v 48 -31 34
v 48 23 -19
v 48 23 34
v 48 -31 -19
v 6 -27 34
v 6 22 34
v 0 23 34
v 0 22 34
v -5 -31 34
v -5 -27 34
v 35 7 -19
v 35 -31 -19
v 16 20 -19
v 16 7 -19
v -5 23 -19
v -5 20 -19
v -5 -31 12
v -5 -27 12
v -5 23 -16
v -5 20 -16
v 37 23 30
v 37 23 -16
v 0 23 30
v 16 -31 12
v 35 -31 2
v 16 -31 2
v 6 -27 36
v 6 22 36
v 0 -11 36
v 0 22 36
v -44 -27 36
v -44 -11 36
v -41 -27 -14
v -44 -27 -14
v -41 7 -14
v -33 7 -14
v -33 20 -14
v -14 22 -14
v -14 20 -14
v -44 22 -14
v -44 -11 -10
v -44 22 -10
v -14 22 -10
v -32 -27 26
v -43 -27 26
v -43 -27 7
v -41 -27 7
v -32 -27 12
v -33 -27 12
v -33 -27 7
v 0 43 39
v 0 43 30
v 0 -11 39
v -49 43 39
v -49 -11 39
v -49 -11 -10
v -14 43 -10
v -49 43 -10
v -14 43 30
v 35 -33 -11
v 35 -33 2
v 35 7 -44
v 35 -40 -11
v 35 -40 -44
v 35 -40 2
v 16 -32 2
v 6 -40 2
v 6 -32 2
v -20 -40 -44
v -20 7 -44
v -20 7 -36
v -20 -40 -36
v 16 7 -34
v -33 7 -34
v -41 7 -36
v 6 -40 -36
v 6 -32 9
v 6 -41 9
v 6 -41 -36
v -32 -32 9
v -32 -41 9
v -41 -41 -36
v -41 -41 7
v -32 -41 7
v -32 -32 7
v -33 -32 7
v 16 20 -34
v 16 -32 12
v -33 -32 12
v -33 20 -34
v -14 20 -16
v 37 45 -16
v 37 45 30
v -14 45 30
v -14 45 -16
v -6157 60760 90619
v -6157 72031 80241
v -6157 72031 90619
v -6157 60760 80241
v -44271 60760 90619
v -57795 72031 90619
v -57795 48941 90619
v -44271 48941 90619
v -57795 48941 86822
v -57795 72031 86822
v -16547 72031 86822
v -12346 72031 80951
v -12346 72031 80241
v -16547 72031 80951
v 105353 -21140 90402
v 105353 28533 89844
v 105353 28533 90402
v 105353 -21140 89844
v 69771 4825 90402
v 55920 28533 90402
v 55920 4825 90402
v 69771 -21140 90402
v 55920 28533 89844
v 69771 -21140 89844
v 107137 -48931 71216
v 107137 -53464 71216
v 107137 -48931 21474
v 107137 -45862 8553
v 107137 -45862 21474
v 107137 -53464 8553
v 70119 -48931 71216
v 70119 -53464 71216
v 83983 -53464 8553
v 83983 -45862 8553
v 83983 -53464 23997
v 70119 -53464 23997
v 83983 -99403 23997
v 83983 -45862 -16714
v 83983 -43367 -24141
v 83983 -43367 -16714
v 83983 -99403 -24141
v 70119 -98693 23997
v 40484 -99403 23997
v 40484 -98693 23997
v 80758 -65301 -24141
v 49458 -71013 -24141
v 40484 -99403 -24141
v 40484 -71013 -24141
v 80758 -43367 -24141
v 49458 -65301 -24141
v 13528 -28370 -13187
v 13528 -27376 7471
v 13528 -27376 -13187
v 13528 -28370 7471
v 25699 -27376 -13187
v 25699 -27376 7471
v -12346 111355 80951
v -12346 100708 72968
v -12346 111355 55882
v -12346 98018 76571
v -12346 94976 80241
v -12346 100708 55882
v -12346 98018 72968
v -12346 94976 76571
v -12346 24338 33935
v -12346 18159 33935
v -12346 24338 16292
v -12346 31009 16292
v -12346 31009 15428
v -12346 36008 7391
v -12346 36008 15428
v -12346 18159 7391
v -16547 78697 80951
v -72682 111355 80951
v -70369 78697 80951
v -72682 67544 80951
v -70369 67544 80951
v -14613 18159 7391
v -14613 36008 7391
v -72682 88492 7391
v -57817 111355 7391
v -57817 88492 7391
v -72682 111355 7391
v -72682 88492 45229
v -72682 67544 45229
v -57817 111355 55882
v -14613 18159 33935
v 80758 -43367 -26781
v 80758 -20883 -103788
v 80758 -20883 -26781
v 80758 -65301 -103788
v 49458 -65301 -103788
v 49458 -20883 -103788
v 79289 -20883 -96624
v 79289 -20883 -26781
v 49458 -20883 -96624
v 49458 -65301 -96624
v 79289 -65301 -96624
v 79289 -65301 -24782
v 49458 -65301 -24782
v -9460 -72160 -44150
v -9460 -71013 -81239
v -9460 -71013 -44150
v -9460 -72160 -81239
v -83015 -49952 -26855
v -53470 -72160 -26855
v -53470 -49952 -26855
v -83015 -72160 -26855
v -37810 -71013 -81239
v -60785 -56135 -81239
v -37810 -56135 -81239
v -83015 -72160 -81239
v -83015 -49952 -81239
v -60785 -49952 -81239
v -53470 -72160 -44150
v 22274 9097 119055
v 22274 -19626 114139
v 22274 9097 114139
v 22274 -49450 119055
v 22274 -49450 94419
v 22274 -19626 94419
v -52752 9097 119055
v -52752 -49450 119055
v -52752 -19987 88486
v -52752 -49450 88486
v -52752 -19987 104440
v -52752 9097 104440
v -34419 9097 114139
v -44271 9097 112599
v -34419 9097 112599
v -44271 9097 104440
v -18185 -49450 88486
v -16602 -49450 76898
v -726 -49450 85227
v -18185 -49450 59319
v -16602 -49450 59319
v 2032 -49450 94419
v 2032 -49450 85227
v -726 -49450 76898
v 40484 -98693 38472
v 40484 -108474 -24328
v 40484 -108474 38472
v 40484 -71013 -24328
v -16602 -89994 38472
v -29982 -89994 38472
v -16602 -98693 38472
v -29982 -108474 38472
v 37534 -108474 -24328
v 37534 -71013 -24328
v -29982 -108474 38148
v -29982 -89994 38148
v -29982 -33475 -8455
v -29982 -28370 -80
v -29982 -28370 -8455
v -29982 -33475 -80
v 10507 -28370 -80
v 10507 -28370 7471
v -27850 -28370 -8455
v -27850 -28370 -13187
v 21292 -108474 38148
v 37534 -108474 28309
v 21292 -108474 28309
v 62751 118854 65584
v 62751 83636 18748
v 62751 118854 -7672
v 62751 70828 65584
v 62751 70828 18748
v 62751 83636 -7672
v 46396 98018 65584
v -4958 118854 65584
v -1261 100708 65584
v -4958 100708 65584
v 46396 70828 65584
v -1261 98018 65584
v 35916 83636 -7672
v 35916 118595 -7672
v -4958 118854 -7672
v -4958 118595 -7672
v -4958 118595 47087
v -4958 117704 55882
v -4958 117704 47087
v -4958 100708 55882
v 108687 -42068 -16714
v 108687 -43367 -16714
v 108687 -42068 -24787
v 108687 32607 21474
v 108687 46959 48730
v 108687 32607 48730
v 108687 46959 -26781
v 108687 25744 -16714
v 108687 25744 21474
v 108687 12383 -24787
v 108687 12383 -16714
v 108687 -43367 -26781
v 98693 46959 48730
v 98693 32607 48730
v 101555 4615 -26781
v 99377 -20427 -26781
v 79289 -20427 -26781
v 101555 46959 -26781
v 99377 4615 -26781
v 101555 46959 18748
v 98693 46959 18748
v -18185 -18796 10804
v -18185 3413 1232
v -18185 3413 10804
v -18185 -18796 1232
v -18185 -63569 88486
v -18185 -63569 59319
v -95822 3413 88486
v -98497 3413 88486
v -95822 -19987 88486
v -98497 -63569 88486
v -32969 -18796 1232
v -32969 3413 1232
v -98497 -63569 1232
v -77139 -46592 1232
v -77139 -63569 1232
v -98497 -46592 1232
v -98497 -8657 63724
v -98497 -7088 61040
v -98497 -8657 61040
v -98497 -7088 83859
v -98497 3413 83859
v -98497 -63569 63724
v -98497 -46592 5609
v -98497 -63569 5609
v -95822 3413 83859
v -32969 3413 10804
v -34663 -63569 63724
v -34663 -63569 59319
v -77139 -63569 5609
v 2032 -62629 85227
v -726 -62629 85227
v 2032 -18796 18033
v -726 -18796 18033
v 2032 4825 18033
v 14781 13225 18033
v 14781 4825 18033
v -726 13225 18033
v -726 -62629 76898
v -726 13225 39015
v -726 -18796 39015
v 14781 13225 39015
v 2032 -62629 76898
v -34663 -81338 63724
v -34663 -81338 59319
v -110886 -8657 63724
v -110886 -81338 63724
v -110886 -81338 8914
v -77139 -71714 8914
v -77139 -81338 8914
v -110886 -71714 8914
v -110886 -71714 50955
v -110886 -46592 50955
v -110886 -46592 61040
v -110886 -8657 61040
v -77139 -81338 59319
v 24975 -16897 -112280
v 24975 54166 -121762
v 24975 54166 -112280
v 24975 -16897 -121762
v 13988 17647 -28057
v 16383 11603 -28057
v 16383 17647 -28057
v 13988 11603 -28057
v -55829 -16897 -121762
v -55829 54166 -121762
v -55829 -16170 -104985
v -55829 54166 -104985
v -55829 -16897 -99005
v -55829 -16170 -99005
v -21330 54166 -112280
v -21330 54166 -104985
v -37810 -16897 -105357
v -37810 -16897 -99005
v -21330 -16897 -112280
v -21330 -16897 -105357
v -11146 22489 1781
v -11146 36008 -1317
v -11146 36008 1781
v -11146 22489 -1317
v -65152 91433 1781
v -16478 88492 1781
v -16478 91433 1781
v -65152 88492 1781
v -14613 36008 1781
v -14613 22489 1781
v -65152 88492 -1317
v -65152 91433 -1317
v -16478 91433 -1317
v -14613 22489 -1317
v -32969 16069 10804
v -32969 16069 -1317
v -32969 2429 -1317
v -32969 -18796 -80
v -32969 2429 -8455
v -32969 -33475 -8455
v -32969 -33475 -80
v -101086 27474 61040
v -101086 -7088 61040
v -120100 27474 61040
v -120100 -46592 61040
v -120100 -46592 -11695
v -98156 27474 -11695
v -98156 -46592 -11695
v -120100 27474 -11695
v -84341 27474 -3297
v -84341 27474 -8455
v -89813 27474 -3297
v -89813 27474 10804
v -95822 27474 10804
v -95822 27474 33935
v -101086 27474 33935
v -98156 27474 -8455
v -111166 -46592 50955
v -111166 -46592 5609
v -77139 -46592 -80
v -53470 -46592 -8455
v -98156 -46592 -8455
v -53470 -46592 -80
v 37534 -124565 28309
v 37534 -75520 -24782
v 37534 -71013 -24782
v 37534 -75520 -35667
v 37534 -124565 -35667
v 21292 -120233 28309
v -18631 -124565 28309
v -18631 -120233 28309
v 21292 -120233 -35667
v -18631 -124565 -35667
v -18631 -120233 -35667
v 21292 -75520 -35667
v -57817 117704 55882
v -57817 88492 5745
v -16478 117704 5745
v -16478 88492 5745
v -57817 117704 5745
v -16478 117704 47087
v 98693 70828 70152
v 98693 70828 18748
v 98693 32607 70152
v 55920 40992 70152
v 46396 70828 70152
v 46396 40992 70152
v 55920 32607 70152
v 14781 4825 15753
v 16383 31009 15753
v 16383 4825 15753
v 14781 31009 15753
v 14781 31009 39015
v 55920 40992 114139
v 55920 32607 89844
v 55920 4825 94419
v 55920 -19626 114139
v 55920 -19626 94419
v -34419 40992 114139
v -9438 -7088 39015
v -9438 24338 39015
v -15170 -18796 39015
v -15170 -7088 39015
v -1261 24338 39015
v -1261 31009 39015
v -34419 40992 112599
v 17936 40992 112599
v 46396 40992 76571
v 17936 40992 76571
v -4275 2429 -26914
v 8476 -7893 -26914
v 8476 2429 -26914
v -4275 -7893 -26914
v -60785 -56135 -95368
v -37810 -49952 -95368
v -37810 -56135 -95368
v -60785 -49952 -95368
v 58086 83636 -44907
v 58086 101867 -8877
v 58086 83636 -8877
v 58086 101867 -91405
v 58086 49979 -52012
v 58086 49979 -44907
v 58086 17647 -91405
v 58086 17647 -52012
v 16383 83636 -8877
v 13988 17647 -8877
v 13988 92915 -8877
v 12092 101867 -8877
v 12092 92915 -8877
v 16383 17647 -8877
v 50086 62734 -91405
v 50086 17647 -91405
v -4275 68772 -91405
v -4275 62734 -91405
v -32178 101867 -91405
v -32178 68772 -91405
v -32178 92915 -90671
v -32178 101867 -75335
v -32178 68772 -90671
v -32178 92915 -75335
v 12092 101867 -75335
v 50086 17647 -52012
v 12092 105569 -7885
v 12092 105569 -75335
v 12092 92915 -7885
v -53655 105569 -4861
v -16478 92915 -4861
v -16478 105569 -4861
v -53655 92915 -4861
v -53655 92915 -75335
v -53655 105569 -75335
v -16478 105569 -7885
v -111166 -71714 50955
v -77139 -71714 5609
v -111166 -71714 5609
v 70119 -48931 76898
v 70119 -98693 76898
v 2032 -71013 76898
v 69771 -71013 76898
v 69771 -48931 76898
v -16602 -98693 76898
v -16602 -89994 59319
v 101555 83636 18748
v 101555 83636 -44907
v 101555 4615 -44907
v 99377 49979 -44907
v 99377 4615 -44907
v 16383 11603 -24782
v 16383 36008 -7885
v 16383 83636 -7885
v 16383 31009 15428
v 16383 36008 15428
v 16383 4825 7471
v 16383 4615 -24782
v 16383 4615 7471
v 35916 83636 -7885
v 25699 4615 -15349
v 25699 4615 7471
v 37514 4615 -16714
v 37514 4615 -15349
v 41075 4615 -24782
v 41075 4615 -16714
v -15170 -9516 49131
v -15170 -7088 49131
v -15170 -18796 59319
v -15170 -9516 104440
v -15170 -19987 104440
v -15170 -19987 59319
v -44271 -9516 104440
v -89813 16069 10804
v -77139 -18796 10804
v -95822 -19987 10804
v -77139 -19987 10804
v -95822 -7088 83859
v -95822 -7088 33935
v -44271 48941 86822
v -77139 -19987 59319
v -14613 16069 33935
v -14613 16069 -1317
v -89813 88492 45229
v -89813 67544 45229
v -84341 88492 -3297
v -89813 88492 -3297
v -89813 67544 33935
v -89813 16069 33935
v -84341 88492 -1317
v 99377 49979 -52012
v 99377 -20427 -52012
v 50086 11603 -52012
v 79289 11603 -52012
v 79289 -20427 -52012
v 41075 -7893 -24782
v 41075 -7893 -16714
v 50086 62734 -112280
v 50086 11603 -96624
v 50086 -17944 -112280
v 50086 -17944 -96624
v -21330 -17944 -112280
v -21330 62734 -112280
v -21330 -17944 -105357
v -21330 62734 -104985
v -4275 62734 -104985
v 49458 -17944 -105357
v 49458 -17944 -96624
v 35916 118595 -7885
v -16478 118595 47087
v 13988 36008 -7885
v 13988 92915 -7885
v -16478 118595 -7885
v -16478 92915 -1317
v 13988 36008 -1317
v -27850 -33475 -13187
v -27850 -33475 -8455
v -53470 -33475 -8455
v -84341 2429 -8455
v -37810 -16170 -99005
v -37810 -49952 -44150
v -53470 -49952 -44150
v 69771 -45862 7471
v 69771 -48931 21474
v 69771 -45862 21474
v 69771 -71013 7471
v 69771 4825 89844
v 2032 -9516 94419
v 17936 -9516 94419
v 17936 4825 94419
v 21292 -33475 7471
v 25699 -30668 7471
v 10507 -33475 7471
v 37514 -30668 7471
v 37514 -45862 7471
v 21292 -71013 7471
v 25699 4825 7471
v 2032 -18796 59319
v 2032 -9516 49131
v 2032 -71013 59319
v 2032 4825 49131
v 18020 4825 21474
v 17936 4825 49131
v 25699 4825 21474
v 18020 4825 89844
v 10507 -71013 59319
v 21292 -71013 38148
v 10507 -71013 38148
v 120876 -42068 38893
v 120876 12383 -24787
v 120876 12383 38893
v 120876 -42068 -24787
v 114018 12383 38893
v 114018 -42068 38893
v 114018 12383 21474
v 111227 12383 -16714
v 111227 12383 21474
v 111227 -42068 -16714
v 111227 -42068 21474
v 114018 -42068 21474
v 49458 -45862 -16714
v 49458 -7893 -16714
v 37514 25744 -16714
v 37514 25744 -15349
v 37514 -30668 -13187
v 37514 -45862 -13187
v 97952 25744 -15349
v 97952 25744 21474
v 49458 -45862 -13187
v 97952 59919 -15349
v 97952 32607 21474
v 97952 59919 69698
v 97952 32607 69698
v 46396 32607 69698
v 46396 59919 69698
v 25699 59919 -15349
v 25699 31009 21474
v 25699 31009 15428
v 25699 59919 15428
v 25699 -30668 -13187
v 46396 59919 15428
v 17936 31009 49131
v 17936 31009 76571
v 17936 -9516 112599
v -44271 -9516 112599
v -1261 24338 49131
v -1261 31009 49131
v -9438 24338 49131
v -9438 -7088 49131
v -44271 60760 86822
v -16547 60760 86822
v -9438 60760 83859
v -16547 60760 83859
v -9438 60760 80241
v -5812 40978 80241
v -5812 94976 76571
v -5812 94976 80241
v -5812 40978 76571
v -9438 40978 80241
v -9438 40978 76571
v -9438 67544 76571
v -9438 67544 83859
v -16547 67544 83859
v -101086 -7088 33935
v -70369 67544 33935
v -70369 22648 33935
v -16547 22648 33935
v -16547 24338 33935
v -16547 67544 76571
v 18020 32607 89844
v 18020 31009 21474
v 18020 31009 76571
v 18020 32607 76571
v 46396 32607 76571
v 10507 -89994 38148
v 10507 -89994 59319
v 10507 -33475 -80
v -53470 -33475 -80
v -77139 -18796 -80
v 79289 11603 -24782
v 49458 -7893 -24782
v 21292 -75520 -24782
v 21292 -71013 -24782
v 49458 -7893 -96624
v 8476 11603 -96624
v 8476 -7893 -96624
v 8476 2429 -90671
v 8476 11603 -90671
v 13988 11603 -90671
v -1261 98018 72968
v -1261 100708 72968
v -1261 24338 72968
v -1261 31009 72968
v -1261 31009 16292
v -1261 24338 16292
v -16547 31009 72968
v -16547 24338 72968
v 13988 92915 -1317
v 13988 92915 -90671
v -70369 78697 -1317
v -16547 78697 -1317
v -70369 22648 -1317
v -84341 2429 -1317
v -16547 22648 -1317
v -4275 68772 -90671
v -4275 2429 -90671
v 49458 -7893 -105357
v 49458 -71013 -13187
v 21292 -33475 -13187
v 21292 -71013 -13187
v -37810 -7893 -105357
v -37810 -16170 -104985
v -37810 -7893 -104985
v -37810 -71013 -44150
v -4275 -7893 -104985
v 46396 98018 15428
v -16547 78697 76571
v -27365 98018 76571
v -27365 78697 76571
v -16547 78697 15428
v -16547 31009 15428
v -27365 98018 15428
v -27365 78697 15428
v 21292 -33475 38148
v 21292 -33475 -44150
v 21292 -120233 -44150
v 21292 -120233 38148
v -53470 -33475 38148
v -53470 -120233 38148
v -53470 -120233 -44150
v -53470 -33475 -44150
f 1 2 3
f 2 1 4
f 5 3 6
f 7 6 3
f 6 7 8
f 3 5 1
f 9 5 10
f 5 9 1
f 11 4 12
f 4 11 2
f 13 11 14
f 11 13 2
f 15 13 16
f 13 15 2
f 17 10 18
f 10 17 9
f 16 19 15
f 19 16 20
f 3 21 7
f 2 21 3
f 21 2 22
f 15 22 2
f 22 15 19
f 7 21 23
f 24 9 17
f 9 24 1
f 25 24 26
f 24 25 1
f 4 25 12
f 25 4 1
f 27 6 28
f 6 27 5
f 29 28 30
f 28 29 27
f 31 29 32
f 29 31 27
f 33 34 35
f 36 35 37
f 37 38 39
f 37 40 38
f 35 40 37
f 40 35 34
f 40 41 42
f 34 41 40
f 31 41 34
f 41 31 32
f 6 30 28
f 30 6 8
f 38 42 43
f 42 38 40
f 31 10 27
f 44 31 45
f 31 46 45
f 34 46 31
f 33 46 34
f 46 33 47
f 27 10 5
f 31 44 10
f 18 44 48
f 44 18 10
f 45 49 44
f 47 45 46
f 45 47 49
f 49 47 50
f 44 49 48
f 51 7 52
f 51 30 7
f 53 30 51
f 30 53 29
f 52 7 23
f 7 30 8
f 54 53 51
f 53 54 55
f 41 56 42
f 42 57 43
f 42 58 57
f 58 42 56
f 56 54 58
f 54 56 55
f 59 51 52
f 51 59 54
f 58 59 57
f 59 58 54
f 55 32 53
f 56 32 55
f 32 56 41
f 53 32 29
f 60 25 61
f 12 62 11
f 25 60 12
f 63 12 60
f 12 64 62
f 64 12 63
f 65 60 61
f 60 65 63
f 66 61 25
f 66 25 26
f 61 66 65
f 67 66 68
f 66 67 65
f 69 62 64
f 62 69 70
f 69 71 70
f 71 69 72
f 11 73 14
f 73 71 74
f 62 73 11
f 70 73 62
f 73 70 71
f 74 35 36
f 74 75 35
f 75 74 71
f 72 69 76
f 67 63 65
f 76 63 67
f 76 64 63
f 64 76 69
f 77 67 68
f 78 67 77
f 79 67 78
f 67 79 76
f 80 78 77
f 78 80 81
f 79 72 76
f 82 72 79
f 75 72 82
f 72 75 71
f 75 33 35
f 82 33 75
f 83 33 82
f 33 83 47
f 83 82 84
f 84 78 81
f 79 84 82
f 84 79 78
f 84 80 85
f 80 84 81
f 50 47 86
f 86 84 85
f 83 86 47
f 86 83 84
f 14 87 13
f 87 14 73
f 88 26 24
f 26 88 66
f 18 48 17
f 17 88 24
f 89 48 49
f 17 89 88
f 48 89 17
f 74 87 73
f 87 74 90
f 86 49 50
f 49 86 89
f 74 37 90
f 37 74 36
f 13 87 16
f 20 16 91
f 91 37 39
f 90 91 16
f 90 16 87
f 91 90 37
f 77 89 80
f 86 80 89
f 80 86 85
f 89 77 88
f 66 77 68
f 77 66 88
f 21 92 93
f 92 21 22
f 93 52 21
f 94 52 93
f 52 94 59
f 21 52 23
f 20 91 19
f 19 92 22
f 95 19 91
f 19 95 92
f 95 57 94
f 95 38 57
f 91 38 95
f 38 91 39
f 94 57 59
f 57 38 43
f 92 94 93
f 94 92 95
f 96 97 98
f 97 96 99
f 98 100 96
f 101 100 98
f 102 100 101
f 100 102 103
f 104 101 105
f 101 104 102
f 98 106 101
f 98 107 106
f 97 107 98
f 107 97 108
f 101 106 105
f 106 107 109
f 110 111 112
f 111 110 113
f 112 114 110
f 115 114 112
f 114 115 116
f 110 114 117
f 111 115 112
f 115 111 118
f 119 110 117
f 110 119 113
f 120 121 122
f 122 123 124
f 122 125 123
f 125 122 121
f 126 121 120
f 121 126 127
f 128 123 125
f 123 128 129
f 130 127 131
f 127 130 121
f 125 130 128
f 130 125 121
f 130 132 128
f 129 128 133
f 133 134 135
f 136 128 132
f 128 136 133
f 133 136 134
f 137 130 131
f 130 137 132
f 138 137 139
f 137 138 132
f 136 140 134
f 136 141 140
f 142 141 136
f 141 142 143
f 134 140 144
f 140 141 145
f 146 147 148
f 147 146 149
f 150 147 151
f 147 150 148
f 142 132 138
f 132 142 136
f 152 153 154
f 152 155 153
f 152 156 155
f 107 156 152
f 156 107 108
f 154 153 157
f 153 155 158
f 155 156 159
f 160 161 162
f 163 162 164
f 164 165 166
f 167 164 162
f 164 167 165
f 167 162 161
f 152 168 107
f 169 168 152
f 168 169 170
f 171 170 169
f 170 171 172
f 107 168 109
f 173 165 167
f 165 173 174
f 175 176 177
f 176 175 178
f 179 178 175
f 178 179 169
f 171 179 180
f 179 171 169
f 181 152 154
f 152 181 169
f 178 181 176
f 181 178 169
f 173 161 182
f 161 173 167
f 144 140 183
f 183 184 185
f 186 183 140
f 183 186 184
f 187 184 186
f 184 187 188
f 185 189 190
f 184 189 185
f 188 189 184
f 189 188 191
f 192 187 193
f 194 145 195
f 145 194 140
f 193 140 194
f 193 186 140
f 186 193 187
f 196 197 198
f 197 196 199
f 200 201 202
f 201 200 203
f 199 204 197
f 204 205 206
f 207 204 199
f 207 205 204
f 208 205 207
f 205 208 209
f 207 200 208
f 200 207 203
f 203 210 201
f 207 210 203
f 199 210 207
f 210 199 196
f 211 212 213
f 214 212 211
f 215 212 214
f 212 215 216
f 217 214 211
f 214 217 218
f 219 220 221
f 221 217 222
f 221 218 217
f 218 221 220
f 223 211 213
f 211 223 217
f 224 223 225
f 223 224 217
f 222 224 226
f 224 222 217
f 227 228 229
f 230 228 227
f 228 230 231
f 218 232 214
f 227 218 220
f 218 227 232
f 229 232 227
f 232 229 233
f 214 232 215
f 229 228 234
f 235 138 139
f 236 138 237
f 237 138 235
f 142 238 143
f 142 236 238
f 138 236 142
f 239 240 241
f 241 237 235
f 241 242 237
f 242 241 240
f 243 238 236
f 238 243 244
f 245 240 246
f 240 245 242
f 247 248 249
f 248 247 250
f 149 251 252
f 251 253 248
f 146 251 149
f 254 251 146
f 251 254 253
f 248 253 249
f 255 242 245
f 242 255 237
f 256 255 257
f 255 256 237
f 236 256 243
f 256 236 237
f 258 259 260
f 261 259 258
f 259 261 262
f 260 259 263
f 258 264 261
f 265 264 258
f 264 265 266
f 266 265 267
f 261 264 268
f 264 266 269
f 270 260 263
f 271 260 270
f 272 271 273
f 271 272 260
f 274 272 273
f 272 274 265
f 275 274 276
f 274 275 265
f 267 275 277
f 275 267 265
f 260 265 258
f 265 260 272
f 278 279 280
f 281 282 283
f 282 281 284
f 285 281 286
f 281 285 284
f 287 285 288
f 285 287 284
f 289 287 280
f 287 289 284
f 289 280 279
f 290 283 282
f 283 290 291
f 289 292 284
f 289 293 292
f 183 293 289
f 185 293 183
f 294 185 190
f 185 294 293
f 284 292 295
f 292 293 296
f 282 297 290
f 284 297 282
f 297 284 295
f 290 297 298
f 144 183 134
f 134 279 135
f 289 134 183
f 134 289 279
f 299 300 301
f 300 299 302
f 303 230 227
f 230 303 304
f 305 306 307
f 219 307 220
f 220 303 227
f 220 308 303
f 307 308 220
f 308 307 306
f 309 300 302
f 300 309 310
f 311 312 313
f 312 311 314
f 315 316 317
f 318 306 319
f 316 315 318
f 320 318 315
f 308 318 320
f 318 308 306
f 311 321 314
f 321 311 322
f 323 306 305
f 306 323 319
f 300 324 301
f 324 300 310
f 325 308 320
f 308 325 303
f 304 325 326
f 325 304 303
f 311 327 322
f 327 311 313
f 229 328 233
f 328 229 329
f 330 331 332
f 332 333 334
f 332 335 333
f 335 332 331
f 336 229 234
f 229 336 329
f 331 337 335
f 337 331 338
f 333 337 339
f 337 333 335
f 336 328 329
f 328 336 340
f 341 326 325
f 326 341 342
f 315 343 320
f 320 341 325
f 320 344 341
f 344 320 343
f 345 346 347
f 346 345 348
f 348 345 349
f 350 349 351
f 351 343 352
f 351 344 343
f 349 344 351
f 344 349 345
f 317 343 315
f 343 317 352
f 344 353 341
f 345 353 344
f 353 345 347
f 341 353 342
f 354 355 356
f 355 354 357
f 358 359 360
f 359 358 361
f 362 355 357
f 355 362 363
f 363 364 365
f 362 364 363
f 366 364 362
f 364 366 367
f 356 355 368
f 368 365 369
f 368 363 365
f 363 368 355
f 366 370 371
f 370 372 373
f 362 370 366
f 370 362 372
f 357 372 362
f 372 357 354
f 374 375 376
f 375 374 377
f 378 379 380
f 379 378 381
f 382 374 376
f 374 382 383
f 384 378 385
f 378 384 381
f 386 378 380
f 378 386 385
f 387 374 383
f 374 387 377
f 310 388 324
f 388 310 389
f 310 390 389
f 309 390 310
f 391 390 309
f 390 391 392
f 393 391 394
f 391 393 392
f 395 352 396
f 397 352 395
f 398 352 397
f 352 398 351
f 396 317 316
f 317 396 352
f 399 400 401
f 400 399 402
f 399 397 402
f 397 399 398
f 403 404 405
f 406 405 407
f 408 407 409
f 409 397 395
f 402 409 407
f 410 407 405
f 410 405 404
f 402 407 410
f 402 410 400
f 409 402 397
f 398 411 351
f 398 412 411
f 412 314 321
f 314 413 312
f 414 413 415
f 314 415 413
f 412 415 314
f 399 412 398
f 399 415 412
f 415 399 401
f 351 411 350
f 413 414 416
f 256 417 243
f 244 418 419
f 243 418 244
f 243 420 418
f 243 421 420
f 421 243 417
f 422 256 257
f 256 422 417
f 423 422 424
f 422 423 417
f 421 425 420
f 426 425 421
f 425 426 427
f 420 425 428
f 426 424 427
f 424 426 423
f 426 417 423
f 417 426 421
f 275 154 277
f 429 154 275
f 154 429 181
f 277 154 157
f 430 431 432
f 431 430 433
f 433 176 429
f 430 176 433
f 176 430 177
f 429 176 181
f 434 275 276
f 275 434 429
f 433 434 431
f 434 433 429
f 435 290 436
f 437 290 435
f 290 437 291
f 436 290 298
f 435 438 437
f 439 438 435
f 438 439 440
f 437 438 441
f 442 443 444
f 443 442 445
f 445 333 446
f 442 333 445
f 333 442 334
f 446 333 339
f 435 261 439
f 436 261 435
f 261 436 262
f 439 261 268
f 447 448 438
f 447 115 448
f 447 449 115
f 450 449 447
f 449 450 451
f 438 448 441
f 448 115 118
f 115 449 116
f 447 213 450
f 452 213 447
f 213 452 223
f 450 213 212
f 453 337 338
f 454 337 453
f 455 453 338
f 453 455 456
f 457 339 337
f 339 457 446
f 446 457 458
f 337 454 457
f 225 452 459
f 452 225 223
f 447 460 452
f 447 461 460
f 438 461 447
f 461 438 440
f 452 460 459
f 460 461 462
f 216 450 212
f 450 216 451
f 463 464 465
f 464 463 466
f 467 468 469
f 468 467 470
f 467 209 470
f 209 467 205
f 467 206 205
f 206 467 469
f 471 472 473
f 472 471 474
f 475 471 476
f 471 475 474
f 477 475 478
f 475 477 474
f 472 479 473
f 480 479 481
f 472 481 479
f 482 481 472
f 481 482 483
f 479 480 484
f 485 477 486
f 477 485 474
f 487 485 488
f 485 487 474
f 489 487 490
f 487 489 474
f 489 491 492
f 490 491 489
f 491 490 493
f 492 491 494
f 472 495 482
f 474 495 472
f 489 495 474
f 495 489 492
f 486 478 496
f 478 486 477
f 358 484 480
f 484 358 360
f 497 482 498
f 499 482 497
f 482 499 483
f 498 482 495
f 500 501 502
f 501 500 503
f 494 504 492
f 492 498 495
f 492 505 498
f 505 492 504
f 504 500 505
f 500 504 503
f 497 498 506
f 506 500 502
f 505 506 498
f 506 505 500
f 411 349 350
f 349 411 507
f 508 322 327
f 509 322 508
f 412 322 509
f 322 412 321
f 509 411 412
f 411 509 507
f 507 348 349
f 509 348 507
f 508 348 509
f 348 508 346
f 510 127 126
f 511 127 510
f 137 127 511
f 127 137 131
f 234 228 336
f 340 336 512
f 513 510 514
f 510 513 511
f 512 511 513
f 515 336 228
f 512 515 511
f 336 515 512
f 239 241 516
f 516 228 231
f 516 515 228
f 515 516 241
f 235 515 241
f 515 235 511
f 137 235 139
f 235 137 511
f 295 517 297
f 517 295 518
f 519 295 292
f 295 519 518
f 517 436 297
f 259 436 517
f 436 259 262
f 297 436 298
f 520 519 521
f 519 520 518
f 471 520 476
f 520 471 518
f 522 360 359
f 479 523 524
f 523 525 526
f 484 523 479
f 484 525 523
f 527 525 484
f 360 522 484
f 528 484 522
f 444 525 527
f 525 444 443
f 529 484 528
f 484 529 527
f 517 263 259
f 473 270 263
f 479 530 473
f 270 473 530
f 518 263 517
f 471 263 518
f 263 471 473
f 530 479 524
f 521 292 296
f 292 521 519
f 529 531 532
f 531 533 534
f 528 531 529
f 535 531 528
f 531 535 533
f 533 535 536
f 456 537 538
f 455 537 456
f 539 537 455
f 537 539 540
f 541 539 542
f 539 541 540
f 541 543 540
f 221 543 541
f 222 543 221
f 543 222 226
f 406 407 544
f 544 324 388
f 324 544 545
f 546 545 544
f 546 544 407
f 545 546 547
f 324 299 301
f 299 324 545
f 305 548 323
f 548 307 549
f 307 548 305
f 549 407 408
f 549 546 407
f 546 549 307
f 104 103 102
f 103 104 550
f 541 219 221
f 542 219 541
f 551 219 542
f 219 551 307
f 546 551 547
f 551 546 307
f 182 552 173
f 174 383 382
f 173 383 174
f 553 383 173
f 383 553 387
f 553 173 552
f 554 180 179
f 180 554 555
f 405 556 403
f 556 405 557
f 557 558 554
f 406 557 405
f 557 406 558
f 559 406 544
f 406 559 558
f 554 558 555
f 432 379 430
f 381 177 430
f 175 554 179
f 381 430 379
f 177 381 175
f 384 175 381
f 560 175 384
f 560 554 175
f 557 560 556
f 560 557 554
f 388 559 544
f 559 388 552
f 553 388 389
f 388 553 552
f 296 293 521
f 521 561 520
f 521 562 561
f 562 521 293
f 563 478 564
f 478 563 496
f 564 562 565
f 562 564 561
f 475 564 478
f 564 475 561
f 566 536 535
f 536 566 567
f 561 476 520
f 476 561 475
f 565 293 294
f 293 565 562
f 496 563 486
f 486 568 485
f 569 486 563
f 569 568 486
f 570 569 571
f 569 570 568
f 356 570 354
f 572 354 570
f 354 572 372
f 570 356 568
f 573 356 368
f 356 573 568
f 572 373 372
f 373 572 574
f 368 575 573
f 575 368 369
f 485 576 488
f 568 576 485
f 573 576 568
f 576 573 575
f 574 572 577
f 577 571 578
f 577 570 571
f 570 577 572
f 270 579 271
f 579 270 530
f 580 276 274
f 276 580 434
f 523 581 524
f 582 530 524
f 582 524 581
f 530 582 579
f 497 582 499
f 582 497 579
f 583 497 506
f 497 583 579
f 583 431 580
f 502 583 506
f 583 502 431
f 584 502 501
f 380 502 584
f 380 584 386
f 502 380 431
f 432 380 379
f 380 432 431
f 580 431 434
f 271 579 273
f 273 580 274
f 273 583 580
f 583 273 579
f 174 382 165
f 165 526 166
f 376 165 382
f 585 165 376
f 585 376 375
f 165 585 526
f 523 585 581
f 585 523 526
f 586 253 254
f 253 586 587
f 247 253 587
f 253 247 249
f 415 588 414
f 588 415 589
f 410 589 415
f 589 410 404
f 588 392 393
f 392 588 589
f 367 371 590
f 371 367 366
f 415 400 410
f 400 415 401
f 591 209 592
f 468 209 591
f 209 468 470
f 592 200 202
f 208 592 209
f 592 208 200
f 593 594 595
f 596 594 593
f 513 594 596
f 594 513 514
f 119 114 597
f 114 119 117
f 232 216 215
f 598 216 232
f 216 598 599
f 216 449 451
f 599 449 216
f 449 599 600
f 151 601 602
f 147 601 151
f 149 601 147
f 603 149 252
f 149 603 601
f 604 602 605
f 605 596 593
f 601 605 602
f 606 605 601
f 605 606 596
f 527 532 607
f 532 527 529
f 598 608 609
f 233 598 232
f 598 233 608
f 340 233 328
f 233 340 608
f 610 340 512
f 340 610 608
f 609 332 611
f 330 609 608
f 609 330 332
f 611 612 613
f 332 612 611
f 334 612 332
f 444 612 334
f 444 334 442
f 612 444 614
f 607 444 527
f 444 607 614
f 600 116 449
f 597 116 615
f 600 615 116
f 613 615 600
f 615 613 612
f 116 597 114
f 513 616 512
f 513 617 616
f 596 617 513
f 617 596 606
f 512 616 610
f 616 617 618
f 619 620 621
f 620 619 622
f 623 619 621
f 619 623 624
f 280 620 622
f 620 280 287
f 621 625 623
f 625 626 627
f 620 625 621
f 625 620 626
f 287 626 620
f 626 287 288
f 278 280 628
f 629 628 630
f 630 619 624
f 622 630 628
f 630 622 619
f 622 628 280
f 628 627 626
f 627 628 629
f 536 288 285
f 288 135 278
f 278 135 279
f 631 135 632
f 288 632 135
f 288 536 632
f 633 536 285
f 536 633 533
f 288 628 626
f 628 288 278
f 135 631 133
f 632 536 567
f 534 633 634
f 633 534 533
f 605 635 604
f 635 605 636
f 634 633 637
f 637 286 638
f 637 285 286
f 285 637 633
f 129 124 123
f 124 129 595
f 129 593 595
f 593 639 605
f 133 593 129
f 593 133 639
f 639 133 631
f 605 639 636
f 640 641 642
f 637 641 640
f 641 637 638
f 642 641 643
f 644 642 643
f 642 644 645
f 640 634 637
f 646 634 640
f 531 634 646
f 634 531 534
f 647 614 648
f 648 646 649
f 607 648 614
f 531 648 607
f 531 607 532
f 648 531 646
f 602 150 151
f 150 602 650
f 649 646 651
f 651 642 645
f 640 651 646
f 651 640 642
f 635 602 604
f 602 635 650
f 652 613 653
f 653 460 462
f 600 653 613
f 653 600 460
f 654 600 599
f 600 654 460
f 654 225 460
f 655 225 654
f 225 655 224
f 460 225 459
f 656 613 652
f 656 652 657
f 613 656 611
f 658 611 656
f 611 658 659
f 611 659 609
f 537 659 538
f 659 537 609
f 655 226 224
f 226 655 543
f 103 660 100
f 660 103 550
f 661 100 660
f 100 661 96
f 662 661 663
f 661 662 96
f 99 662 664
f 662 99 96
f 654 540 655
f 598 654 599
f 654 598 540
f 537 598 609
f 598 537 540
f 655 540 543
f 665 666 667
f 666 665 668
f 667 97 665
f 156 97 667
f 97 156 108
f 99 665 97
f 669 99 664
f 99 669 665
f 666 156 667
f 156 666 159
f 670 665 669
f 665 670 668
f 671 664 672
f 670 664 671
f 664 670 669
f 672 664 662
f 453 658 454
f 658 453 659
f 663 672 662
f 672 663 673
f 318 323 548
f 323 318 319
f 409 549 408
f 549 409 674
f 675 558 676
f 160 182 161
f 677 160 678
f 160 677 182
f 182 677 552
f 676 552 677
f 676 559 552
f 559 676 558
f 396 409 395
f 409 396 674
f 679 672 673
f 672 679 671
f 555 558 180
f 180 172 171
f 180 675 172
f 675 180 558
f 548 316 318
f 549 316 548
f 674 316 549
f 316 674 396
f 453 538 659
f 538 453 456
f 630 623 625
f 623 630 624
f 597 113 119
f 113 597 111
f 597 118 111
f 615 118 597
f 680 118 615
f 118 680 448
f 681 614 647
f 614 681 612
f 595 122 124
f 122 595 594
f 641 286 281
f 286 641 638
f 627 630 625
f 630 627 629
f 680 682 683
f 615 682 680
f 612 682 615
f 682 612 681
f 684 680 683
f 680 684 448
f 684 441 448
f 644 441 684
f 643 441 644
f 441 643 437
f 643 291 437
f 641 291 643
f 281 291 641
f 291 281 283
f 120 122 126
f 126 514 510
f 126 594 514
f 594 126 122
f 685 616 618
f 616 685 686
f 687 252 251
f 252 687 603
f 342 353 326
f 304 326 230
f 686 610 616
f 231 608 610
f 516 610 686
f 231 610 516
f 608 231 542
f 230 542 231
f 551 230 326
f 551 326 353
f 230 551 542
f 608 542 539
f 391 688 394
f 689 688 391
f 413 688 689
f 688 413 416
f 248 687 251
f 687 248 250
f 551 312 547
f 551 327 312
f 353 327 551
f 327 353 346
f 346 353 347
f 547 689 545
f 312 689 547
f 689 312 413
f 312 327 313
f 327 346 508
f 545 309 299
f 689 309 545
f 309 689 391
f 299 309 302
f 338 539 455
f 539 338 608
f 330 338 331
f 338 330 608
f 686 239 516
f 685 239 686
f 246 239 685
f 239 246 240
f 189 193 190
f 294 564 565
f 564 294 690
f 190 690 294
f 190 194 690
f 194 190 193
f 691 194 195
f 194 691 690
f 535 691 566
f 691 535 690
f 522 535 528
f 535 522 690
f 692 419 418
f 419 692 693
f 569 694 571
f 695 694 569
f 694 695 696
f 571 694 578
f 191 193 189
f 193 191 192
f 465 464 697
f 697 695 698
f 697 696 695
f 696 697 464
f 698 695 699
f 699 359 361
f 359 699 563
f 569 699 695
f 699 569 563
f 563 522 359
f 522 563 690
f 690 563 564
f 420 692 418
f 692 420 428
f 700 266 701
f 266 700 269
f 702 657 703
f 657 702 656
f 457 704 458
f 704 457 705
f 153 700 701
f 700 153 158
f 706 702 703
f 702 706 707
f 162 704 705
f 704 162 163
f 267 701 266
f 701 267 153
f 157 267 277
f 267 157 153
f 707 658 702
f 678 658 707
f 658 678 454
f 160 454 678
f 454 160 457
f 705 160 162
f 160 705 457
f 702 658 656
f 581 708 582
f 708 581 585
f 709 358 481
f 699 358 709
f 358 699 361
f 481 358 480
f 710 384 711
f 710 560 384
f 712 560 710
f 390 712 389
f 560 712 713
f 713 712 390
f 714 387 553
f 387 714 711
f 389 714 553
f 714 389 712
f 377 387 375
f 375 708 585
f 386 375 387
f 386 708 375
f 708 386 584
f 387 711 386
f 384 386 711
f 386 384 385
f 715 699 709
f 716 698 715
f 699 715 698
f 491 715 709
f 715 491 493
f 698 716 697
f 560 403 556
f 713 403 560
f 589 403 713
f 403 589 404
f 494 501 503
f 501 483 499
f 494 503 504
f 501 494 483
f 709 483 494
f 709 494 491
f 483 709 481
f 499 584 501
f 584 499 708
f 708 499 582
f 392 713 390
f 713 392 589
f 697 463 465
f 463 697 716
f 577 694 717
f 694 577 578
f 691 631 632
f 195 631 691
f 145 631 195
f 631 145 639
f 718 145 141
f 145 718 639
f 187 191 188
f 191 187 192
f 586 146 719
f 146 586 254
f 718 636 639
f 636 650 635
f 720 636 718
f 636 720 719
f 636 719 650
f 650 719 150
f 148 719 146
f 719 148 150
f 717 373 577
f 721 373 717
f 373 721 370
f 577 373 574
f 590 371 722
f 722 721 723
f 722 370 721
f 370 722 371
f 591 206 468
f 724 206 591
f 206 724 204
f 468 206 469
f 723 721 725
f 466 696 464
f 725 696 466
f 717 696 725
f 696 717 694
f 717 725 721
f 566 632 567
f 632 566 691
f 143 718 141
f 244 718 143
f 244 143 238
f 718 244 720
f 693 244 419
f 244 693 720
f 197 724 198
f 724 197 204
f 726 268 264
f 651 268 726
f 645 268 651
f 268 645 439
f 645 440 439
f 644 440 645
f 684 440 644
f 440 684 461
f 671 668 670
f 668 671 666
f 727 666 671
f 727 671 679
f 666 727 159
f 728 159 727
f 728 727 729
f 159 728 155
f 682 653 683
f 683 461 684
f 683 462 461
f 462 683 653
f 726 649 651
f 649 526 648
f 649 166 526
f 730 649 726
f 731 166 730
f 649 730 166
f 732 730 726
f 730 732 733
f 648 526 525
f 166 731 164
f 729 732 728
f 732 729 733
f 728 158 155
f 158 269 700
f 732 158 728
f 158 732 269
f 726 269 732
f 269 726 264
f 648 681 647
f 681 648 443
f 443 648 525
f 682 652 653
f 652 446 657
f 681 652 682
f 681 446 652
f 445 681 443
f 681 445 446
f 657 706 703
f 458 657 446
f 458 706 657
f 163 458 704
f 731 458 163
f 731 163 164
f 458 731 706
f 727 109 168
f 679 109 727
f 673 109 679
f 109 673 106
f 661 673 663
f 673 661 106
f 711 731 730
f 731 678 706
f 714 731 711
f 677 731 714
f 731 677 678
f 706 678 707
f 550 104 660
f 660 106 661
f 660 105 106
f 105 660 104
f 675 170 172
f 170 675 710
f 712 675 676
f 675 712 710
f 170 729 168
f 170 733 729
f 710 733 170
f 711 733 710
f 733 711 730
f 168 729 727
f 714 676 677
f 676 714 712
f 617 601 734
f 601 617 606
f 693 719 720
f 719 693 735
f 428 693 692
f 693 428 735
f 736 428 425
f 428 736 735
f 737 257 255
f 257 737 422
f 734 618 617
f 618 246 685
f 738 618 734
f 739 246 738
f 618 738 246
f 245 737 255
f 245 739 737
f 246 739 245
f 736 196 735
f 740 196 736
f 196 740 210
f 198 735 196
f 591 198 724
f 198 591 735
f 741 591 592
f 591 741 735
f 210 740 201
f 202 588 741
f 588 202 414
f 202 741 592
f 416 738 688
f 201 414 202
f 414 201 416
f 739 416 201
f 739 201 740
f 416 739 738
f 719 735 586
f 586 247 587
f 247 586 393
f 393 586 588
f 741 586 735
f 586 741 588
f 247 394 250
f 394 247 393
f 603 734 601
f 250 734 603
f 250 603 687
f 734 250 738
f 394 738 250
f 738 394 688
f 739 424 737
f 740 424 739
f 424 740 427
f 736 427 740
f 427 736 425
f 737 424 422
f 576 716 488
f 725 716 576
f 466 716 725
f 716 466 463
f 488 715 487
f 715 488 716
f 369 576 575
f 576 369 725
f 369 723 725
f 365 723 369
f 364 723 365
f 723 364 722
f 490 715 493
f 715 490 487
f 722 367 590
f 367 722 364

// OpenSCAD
difference(){union(){
difference(){union(){
 difference(){union(){
  difference(){union(){
   difference(){union(){
    difference(){union(){
     difference(){union(){
      difference(){union(){
       difference(){union(){
        translate([-5,-31,-19]) cube([53,54,53]);
        translate([-44,-27,-14]) cube([50,49,50]);
        translate([-49,-11,-10]) cube([49,54,49]);
        translate([-20,-40,-44]) cube([55,47,46]);
        }
        translate([26,40,-2]) cube([14,11,14]);
        }
       translate([-41,-41,-36]) cube([47,48,45]);
       }
       translate([-43,-45,7]) cube([11,18,19]);
       }
      translate([-33,-32,-34]) cube([49,52,46]);
      }
      translate([35,-46,-11]) cube([13,13,17]);
      }
     translate([-14,-6,-16]) cube([51,51,46]);
     translate([-57795,29564,20435]) cube([51638,42467,70184]);
     translate([36731,-21140,16094]) cube([68622,49673,74308]);
     translate([30999,-53464,8553]) cube([76138,68978,62663]);
     translate([13528,-99403,-24141]) cube([70455,72027,48138]);
     translate([-72682,18159,7391]) cube([60336,93196,73560]);
     translate([-1060,-65301,-103788]) cube([81818,44418,87080]);
     translate([-83015,-72160,-81239]) cube([73555,63814,54384]);
     translate([-52752,-49450,54442]) cube([75026,58547,64613]);
     translate([-29982,-108474,-24328]) cube([70466,80104,62800]);
     translate([-4958,40422,-7672]) cube([67709,78432,73256]);
     translate([55694,-43367,-26781]) cube([52993,90326,75511]);
     translate([-98497,-63569,1232]) cube([80312,66982,87254]);
     translate([-726,-62629,18033]) cube([57018,75854,67194]);
     translate([-110886,-81338,8914]) cube([76223,72681,54810]);
     translate([-55829,-16897,-121762]) cube([80804,71063,93705]);
     translate([-65152,22489,-58782]) cube([54006,68944,60563]);
     translate([-120100,-46592,-11695]) cube([87131,74066,72735]);
     translate([-18631,-124565,-35667]) cube([56165,73762,63976]);
     translate([-57817,49321,5745]) cube([76066,68383,50137]);
     translate([14781,-1341,15753]) cube([83912,72169,54399]);
     translate([-34419,-19626,39015]) cube([90339,60618,75124]);
     translate([-60785,-56135,-95368]) cube([72379,59135,68454]);
     translate([-32178,17647,-91405]) cube([90264,84220,82528]);
     translate([-53655,50097,-75335]) cube([65747,55472,70474]);
     translate([-111166,-71714,5609]) cube([70170,74403,45346]);
     translate([-16602,-98693,5197]) cube([86721,54293,71701]);
     translate([16383,4615,-44907]) cube([85172,79021,63655]);
     }
     translate([-95822,-19987,10804]) cube([80652,68928,93636]);
     }
    translate([-89813,16069,-3297]) cube([75200,72423,48526]);
    translate([41075,-20427,-52012]) cube([58302,70406,65775]);
    translate([-21330,-17944,-112280]) cube([71416,80678,82084]);
    translate([-16478,36008,-7885]) cube([52394,82587,54972]);
    }
    translate([-98156,-49952,-99005]) cube([70306,93124,90550]);
    translate([2032,-71013,7471]) cube([67739,75838,86948]);
    }
   translate([43670,-42068,-24787]) cube([77206,54451,63680]);
   }
   translate([37514,-45862,-16714]) cube([73713,71606,71378]);
   translate([25699,-30668,-15349]) cube([72253,90587,85047]);
   translate([-44271,-9516,49131]) cube([62207,70276,63468]);
   }
  translate([-61695,40978,8655]) cube([55883,53998,71586]);
  }
  translate([-101086,-7088,33935]) cube([91648,74632,49924]);
  translate([18020,-48931,21474]) cube([95998,81538,68370]);
  translate([-77139,-89994,-80]) cube([87646,71198,59399]);
  translate([8476,-75520,-96624]) cube([70813,87123,71842]);
  }
 translate([-47488,24338,16292]) cube([46227,76370,56676]);
 }
 translate([-84341,2429,-90671]) cube([98329,90486,89354]);
 translate([-37810,-71013,-105357]) cube([87268,63120,92170]);
 translate([-27365,31009,15428]) cube([73761,67009,61143]);
 translate([-70369,22648,-1892]) cube([53822,56049,88714]);
 }
translate([-53470,-120233,-44150]) cube([74762,86758,82298]);
}
translate([-93533,-16170,-104985]) cube([89258,84942,80479]);
}
